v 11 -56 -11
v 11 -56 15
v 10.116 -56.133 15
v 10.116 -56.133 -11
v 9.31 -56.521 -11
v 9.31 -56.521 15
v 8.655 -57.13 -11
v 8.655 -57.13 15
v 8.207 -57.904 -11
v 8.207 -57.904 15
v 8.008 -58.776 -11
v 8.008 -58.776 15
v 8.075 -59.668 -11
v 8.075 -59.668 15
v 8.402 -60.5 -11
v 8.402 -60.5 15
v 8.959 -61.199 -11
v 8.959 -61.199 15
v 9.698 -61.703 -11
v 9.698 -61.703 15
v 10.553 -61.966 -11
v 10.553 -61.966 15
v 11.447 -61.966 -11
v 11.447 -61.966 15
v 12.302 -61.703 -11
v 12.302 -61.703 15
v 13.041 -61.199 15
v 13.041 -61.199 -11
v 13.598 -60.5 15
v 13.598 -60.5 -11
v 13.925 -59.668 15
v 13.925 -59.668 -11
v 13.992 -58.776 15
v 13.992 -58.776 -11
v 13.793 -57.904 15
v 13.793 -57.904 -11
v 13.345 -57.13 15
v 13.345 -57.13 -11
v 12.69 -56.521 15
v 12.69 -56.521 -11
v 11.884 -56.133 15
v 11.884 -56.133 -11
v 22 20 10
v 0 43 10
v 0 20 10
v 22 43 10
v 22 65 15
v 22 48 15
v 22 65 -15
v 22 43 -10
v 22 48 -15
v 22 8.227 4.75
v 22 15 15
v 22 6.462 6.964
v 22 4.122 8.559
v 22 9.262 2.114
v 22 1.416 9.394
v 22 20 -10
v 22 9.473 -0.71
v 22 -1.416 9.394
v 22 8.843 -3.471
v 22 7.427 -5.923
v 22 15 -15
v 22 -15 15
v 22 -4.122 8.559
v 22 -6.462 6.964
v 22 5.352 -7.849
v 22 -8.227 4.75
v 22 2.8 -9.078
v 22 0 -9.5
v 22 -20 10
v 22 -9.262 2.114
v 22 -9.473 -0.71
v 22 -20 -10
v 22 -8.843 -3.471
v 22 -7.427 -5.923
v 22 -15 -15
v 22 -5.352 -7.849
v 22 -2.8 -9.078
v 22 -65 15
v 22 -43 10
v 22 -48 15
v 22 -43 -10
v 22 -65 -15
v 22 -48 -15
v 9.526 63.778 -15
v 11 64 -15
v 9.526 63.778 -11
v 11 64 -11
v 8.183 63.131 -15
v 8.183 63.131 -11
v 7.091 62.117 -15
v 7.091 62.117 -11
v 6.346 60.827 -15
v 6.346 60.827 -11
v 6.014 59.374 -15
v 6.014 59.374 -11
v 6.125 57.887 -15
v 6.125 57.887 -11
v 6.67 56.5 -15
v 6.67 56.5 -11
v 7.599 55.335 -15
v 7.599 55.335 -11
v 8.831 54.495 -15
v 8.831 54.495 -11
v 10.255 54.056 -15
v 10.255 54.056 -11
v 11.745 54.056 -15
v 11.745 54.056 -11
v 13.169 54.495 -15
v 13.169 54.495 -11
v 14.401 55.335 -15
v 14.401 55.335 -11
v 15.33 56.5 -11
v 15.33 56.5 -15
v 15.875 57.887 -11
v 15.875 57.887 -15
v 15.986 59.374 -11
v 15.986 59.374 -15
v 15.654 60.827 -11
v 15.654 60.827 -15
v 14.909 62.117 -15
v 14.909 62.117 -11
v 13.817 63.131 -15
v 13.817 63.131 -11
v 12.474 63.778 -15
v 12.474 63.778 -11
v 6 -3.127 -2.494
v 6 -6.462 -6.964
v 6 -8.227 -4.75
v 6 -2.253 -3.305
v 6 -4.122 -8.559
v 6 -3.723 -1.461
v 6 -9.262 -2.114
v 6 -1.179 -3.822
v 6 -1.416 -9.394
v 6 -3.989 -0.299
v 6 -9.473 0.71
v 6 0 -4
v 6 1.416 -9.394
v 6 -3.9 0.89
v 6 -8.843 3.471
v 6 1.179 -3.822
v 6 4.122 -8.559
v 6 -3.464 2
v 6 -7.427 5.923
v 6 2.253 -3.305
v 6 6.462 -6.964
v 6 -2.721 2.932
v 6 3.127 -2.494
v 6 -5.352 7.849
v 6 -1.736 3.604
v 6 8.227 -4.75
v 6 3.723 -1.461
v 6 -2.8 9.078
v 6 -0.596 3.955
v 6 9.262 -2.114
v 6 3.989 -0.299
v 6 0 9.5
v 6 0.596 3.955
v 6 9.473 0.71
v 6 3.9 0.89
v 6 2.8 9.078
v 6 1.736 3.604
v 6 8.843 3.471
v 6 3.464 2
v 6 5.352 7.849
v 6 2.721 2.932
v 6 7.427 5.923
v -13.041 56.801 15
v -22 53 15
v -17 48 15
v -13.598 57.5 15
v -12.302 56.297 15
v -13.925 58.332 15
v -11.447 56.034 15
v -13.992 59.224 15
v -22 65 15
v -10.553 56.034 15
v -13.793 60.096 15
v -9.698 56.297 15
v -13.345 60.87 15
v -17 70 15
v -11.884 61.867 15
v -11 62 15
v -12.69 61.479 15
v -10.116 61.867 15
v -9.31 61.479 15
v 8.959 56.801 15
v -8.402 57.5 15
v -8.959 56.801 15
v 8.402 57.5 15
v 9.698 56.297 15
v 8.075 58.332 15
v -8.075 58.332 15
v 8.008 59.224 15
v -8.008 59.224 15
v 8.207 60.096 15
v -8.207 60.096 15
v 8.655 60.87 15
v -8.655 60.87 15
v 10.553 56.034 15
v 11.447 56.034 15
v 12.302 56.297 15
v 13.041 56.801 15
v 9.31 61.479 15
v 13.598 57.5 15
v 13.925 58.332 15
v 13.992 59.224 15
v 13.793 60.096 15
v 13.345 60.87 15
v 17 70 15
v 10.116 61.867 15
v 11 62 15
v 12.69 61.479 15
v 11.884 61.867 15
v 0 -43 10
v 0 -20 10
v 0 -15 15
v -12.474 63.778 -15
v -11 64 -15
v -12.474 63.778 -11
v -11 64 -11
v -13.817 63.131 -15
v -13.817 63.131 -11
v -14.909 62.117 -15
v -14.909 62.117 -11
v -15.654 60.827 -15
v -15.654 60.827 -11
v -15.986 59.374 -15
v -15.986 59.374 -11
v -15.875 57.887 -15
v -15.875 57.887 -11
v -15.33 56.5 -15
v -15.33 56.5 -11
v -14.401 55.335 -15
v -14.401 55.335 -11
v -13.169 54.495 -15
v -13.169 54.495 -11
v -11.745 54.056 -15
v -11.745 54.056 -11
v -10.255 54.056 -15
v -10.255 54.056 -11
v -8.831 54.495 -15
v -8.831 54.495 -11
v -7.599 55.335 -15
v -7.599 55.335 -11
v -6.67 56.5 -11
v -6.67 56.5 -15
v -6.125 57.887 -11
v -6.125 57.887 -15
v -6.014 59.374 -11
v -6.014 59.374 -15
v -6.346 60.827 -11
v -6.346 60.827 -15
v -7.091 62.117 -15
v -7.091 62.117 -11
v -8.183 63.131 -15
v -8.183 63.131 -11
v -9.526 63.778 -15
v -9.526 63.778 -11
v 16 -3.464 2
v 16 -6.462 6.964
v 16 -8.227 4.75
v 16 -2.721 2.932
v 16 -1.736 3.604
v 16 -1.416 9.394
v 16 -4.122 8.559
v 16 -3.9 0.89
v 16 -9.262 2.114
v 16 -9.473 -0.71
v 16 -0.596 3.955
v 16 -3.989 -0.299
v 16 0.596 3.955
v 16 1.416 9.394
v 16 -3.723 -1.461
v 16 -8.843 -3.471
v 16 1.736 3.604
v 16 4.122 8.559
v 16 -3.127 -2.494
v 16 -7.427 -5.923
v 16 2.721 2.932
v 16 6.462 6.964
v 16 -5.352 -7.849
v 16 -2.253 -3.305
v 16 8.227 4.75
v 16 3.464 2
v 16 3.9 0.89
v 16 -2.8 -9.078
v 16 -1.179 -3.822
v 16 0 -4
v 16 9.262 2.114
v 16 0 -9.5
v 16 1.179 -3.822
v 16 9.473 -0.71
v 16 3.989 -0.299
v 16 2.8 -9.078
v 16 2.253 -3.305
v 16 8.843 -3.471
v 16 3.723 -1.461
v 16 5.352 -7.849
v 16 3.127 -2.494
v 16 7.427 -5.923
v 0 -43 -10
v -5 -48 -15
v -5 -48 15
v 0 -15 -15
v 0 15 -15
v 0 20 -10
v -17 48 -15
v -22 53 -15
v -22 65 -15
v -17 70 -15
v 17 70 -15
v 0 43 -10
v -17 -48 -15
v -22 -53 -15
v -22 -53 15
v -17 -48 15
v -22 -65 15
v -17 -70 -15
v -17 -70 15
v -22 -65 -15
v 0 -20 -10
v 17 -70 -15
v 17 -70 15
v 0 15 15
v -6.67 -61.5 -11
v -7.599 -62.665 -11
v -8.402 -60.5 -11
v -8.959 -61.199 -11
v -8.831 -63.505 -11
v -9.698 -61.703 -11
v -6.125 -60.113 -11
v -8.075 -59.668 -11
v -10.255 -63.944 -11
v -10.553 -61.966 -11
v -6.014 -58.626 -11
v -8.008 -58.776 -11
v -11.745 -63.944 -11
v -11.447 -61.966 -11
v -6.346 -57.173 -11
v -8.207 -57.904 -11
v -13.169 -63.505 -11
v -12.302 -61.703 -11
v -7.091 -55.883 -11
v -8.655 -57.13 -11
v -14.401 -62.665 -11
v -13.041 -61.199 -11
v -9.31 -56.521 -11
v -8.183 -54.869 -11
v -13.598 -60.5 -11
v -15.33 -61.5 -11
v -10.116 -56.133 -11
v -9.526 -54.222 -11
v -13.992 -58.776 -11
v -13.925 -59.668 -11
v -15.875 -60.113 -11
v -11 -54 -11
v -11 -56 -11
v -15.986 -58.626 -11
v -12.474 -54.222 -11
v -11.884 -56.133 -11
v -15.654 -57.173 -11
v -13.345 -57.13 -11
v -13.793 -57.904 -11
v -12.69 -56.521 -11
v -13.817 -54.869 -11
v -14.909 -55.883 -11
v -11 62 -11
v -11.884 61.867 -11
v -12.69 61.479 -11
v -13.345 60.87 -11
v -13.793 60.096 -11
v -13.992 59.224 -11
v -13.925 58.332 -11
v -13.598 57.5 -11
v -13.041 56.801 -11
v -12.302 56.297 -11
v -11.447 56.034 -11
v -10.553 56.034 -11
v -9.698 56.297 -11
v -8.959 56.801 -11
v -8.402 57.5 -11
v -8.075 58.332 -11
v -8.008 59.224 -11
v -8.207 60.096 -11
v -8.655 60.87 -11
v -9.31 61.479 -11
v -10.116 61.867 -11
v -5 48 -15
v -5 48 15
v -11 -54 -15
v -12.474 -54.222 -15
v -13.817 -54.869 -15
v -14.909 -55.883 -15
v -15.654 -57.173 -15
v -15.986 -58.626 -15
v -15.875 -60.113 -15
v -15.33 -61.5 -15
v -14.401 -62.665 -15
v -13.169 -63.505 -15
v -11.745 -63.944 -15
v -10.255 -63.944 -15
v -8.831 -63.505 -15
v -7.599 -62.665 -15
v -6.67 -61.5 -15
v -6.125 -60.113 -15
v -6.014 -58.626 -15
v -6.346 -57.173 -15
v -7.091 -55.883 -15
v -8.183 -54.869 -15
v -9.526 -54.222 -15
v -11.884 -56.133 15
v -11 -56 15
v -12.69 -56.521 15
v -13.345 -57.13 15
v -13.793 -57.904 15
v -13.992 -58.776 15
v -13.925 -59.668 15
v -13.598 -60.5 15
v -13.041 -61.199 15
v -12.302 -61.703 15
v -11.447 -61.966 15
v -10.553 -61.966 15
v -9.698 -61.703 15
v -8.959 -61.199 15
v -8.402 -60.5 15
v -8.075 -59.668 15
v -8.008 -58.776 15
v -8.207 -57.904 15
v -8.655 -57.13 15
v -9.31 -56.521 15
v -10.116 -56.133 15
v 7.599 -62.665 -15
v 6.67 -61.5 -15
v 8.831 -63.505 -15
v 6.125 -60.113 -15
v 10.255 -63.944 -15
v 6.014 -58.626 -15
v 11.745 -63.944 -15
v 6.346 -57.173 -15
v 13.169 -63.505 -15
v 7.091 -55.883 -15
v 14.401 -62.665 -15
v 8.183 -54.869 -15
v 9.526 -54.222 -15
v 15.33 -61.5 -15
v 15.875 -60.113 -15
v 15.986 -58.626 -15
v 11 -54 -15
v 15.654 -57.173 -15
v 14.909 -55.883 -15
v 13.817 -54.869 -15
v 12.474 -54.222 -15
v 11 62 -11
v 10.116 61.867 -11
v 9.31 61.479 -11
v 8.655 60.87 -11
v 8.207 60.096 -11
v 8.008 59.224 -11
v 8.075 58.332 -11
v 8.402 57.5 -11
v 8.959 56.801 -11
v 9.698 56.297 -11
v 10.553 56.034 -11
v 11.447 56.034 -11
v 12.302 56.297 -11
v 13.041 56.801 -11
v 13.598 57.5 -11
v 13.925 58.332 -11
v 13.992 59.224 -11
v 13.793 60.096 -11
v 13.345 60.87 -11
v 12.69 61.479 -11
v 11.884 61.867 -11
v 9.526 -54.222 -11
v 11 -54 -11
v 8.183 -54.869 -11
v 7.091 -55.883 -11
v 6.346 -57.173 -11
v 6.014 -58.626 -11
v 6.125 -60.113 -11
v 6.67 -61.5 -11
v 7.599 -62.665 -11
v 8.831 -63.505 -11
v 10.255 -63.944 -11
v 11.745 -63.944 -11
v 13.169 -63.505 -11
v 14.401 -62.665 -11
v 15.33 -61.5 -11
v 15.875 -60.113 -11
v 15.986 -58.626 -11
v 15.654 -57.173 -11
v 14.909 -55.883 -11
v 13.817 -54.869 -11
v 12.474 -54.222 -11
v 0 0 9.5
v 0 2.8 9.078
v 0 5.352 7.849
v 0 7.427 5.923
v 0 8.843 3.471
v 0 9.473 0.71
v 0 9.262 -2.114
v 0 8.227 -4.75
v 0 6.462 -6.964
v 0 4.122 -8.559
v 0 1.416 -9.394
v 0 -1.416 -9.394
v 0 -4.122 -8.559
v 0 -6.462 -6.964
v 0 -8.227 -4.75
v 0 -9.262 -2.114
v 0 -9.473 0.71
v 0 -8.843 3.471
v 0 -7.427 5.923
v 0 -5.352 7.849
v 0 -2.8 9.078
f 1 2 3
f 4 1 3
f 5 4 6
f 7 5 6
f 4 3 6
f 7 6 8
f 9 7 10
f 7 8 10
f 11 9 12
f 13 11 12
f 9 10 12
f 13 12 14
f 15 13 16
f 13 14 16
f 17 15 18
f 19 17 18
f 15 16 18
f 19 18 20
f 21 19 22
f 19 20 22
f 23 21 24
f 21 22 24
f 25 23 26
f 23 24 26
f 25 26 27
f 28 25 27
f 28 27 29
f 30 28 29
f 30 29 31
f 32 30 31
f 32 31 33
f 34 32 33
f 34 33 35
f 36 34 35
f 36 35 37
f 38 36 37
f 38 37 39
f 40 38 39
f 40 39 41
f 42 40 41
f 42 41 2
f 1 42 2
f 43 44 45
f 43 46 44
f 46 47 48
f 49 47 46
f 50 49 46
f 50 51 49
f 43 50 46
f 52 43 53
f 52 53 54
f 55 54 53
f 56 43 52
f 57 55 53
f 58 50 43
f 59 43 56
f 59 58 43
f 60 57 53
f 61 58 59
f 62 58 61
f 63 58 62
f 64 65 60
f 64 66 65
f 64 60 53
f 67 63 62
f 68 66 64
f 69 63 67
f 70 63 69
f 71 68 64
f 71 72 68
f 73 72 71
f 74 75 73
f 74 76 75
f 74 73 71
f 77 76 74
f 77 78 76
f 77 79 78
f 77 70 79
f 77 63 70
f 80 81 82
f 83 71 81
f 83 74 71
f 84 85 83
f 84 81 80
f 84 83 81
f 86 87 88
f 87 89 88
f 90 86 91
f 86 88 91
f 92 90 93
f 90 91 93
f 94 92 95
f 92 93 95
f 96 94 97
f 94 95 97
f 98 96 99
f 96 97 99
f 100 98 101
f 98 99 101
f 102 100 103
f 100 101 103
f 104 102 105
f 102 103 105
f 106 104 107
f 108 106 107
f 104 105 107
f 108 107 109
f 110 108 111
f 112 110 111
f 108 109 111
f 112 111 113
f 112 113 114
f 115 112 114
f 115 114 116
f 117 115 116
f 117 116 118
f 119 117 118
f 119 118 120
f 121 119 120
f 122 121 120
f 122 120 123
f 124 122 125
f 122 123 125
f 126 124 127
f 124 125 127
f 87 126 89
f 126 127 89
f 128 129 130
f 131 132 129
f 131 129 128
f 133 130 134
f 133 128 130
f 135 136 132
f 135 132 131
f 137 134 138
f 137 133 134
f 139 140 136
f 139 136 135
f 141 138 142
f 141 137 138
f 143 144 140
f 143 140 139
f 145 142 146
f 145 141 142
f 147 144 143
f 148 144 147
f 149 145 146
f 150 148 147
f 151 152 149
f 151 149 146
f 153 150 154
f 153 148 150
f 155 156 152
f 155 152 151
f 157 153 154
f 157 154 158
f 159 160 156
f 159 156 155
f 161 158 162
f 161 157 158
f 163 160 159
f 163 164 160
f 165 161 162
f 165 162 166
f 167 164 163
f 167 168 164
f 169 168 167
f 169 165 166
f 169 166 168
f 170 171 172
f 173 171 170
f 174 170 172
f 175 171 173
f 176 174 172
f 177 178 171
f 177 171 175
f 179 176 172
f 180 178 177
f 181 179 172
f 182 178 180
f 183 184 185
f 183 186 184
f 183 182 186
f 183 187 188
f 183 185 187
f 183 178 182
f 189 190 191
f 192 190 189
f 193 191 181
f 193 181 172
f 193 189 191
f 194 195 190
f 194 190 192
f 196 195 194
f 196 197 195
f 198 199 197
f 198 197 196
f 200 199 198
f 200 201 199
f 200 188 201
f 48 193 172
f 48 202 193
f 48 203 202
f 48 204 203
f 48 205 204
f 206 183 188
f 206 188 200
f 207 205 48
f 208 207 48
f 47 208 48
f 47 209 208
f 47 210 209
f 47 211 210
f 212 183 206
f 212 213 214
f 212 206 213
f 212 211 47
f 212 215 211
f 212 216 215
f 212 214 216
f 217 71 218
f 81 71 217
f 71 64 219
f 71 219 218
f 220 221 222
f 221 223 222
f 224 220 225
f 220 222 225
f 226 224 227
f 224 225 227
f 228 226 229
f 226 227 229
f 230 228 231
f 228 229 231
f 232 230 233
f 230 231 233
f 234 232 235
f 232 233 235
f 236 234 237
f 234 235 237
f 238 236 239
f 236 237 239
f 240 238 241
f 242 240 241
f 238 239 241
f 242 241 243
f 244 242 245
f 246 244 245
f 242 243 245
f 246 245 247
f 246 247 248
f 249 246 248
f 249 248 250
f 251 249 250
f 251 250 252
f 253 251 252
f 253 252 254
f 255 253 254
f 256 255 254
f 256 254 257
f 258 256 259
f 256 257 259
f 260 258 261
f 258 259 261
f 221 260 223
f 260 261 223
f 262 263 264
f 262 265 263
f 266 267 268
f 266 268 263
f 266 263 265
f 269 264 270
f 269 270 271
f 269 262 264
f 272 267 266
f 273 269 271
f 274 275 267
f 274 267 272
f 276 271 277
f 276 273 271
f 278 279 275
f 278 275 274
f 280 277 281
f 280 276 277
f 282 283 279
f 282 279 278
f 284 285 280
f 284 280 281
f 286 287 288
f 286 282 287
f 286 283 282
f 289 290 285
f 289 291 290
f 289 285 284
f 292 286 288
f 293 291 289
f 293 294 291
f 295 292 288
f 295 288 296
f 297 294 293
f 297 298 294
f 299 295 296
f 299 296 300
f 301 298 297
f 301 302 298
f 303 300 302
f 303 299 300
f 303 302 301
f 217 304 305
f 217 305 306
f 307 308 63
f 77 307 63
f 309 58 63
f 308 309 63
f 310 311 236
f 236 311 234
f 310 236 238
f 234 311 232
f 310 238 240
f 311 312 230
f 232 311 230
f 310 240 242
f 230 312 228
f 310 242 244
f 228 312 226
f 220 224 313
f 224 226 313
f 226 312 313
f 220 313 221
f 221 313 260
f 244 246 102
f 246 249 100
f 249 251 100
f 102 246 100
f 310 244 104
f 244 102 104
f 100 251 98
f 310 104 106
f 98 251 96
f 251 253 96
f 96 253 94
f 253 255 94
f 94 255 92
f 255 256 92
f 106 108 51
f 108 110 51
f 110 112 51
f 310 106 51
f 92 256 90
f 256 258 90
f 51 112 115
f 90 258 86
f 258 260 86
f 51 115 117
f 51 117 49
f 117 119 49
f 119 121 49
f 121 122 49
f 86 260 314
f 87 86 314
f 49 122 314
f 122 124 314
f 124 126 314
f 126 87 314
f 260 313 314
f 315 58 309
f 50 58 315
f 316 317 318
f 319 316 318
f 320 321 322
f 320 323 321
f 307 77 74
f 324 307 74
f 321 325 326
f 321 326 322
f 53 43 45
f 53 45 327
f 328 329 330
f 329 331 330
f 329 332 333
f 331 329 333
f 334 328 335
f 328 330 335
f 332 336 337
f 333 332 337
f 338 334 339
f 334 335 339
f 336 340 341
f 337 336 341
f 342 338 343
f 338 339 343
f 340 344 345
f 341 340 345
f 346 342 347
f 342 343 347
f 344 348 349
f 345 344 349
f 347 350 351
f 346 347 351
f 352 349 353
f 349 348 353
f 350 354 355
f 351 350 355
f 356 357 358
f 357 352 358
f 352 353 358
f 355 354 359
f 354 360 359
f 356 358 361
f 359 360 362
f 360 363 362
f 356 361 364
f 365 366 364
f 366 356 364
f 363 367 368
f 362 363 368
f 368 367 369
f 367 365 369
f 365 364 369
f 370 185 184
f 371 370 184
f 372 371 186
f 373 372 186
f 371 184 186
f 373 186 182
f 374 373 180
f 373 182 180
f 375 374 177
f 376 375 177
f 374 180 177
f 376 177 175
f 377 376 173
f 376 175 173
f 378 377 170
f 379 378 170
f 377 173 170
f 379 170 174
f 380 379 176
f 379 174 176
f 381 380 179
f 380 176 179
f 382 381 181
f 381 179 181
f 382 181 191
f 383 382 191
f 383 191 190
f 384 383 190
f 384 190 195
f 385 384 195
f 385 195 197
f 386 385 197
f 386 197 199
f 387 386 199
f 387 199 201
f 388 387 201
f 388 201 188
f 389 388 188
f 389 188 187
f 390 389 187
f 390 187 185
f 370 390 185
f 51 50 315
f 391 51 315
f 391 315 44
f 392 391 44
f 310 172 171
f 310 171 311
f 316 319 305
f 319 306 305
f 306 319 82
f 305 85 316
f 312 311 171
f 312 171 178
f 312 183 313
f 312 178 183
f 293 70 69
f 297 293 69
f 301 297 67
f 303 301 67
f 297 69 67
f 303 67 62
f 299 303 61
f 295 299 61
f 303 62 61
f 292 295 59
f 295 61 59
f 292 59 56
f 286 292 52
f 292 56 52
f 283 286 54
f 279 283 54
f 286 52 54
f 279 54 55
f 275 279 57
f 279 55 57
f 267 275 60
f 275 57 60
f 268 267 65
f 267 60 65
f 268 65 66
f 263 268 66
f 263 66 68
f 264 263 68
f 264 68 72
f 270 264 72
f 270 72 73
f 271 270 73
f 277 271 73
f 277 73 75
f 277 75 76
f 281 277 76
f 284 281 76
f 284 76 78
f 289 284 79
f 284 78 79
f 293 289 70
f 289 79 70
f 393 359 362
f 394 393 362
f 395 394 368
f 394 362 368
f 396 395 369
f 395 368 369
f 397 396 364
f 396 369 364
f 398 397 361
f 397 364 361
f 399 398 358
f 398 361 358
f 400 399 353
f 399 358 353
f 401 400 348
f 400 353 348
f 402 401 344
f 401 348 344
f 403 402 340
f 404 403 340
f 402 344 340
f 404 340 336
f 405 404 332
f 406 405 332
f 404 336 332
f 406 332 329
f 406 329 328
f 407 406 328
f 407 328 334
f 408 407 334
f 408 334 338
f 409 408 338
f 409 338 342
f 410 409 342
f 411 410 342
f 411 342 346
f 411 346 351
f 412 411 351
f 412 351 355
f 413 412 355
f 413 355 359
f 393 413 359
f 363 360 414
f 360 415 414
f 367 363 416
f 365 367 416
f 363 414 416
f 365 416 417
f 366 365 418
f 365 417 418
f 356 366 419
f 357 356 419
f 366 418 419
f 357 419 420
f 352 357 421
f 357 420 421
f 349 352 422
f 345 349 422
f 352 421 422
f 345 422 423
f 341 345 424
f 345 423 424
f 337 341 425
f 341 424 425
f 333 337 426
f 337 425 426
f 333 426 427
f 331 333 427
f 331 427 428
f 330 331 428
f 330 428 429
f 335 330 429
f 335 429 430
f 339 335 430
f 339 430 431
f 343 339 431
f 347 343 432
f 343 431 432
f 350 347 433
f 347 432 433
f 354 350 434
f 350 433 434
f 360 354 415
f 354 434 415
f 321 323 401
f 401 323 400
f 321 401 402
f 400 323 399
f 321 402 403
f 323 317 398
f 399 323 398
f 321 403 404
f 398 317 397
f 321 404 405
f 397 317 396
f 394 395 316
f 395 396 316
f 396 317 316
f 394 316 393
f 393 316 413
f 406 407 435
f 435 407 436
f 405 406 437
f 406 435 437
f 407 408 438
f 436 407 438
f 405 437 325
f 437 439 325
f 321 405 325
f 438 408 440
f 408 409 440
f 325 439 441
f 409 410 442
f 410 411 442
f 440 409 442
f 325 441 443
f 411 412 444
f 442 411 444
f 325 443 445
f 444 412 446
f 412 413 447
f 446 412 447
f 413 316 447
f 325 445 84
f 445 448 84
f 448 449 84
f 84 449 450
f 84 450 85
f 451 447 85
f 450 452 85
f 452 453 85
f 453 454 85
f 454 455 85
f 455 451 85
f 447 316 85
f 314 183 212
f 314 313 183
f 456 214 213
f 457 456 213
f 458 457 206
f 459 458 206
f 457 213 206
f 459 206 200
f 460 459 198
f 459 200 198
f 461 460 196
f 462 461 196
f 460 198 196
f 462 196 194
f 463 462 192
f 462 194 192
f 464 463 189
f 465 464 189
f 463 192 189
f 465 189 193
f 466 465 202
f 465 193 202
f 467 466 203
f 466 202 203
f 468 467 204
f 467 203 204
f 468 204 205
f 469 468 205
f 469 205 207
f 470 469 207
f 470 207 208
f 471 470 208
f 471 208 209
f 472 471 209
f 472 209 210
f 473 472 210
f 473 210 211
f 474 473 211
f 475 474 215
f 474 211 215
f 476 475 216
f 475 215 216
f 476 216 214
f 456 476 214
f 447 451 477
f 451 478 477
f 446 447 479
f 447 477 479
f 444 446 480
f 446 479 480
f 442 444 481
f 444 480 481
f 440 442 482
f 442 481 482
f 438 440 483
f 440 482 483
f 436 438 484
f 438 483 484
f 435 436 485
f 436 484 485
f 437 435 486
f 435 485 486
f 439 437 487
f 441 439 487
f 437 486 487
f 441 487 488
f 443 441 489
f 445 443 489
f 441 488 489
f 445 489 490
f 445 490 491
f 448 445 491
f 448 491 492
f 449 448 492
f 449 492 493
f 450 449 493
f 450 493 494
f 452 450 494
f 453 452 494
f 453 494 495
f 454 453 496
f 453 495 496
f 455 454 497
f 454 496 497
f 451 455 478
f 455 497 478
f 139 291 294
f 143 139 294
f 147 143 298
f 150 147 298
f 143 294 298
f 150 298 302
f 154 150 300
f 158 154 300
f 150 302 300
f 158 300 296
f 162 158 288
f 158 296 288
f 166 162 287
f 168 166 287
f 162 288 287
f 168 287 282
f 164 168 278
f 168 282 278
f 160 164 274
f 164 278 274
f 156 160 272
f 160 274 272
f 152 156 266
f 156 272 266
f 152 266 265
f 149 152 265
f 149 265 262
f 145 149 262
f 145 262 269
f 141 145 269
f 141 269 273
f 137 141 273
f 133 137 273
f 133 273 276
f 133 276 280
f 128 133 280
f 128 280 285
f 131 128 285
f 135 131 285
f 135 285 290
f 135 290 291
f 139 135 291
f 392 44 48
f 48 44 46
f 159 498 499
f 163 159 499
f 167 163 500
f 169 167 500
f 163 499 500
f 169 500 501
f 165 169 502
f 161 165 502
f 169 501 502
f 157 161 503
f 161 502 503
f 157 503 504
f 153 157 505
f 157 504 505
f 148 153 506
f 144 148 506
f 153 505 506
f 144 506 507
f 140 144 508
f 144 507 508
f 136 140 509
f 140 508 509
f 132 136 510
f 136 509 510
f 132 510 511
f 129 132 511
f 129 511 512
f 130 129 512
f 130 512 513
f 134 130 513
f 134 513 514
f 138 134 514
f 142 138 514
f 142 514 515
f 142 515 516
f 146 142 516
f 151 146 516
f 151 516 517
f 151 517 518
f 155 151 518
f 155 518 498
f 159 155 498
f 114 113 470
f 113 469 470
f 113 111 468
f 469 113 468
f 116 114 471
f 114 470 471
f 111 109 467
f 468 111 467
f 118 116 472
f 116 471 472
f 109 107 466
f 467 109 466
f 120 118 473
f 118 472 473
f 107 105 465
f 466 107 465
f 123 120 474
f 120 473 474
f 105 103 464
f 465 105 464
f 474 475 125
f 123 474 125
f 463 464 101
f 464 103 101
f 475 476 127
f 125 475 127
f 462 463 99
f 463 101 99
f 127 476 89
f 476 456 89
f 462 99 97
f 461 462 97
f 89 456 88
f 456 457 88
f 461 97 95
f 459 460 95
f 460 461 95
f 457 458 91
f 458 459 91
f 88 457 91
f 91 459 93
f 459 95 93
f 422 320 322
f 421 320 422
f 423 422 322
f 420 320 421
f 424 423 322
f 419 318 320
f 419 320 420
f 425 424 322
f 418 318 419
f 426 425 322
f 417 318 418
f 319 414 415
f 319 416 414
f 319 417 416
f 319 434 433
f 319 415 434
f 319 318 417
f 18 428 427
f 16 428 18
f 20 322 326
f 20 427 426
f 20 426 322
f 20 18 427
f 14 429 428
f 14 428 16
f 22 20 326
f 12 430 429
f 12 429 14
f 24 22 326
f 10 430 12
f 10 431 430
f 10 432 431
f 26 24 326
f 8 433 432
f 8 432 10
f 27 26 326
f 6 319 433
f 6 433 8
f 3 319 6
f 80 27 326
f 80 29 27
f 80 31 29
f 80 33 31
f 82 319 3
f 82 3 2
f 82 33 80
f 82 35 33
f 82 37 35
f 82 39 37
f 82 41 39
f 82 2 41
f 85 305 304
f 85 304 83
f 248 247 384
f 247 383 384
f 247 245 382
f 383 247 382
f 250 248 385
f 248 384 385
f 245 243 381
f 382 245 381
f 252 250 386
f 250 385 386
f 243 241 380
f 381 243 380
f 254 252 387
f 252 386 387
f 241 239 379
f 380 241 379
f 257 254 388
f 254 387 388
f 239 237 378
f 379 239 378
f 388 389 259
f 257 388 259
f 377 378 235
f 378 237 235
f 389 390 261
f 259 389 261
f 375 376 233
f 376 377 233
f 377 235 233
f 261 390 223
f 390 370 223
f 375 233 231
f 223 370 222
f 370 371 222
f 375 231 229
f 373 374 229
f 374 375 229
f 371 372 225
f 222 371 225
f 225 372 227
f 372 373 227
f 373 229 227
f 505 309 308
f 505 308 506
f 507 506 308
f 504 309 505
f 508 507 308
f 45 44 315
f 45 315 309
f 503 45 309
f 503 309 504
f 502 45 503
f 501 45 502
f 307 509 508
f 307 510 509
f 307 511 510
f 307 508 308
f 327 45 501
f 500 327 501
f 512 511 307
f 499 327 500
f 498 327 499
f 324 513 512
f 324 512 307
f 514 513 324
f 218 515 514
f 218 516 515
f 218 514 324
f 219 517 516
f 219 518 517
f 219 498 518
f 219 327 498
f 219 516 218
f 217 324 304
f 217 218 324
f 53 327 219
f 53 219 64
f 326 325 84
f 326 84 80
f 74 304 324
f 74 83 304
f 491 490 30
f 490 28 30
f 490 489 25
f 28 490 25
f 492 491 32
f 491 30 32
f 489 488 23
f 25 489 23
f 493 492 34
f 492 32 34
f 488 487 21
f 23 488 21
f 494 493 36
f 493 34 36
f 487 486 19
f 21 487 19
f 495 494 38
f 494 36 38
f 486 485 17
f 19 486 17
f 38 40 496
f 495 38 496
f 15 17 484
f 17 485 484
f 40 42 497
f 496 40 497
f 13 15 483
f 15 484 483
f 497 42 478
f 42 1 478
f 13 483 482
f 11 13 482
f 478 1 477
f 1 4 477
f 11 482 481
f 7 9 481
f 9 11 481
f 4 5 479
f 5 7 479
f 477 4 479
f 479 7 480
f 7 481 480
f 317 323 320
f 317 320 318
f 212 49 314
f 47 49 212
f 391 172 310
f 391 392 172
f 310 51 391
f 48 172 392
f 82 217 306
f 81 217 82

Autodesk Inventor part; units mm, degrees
ref_plane "YZ Plane" through (0, 0, 0) normal (1, 0, 0) x (0, 1, 0)
ref_plane "XZ Plane" through (0, 0, 0) normal (0, 1, 0) x (-1, 0, 0)
ref_plane "XY Plane" through (0, 0, 0) normal (0, 0, 1) x (1, 0, 0)
sketch "Esquisse17" plane through (0, 0, 0) normal (0, 0, 1) x (1, 0, 0)
  line L0 (-22, 70) -> (22, 70)
  line L1 (22, 70) -> (22, -70)
  line L2 (22, -70) -> (-22, -70)
  line L3 (-22, -70) -> (-22, 70)
  point P0 (0, 0)
  dimension "d107" = 70
  dimension "d108" = 140
  dimension "d109" = 44
  dimension "d110" = 22
extrude "Extrusion13" add sketch "Esquisse17" along normal mid plane 30
sketch "Esquisse18" plane through (22, -70, 15) normal (1, 0, 0) x (0, 0, -1)
  circle A0 centre (15, 70) radius 4
  dimension "d113" = 8
extrude "Extrusion14" cut sketch "Esquisse18" against normal up to next
sketch "Esquisse19" plane through (22, -70, 15) normal (1, 0, 0) x (0, 0, -1)
  circle A0 centre (15, 70) radius 9.5
  dimension "d116" = 19
extrude "Extrusion15" cut sketch "Esquisse19" against normal blind 6
sketch "Esquisse20" plane through (0, 0, 15) normal (0, 0, 1) x (1, 0, 0)
  line L0 (-22, 48) -> (0, 48)
  line L1 (0, 48) -> (0, -48)
  line L2 (0, -48) -> (-22, -48)
  line L3 (-22, -48) -> (-22, 48)
  line L4 (22, -70) -> (22, 70) projected
  line L5 (-22, 70) -> (-22, -70) projected
  point P0 (0, 0)
  dimension "d119" = 96
  dimension "d120" = 48
  dimension "d121" = 22
extrude "Extrusion16" cut sketch "Esquisse20" against normal up to next
sketch "Esquisse21" plane through (0, -48, 15) normal (-1, 0, 0) x (0, 0, 1)
  circle A0 centre (-15, 48) radius 9.5
  dimension "d125" = 19
extrude "Extrusion17" cut sketch "Esquisse21" against normal blind 6
sketch "Esquisse22" plane through (22, -70, 15) normal (1, 0, 0) x (0, 0, -1)
  line L0 (5, 0) -> (25, 0)
  line L1 (25, 140) -> (5, 140)
  line L2 (0, 0) -> (30, 0) projected
  line L3 (0, 140) -> (30, 140) projected
  line L4 (0, 0) -> (0, 140) projected
  line L5 (30, 140) -> (30, 0) projected
  line L6 (30, 55) -> (30, 85)
  line L7 (0, 85) -> (0, 55)
  line L8 (0, 55) -> (0, 55)
  line L9 (30, 55) -> (30, 55)
  line L10 (5, 140) -> (5, 90)
  line L11 (5, 50) -> (5, 0)
  line L12 (25, 0) -> (25, 50)
  line L13 (25, 90) -> (25, 140)
  line L14 (30, 85) -> (30, 85)
  line L15 (0, 85) -> (0, 85)
  line L16 (0, 55) -> (5, 50)
  line L17 (5, 90) -> (0, 85)
  line L18 (25, 90) -> (30, 85)
  line L19 (30, 55) -> (25, 50)
  line L20 (0, 118) -> (5, 118)
  line L21 (25, 118) -> (30, 118)
  line L22 (0, 22) -> (5, 22)
  line L23 (25, 22) -> (30, 22)
  point P0 (15, 70)
  point P1 (5, 55)
  point P2 (25, 55)
  point P3 (5, 85)
  point P4 (25, 85)
  dimension "d131" = 30
  dimension "d133" = 20
  dimension "d134" = 10
  dimension "d135" = 30
  dimension "d136" = 15
  dimension "d137" = 5
  dimension "d138" = 5
  dimension "d139" = 5
  dimension "d140" = 5
  dimension "d141" = 5
  dimension "d142" = 5
  dimension "d143" = 5
  dimension "d144" = 5
extrude "Extrusion19" cut sketch "Esquisse22" against normal up to next contours L22 L4 L16 L11 | L12 L19 L5 L23 | L4 L20 L10 L17 | L18 L13 L21 L5
chamfer "Chanfrein3" distance 5 angle 45 10 edges at (11, -48, -10) (11, -48, 10) (11, 48, 10) (11, 48, -10) (-22, -48, 0) (-22, -70, 0) (-22, 48, 0) (-22, 70, 0) (22, -70, 0) (22, 70, 0)
sketch "Esquisse23" plane through (0, 0, -15) normal (0, 0, -1) x (-1, 0, 0)
  line L0 (-11, -59) -> (11, -59)
  line L1 (17, -48) -> (0, -48) projected
  line L2 (0, -48) -> (-22, -48) projected
  line L3 (-22, -48) -> (-22, -65) projected
  line L4 (-17, -70) -> (17, -70) projected
  line L5 (22, -65) -> (22, -53) projected
  line L6 (-46.7579, 0) -> (65.4048, 0)
  line L7 (-11, 59) -> (11, 59)
  line L8 (20, 48) -> (0, 48)
  line L9 (0, 48) -> (-22, 48)
  line L10 (-22, 48) -> (-22, 70)
  line L11 (-22, 70) -> (20, 70)
  line L12 (20, 70) -> (20, 48)
  line L13 (0, 15) -> (-22, 15) projected
  line L14 (-22, 15) -> (-22, -15) projected
  line L15 (-22, -15) -> (0, -15) projected
  line L16 (0, -15) -> (0, 15) projected
  line L17 (-17, -70) -> (-22, -65) projected
  line L18 (22, -65) -> (17, -70) projected
  line L19 (17, -48) -> (22, -53) projected
  line L20 (-22, 65) -> (-17, 70) projected
  line L21 (-22, 48) -> (0, 48) projected
  line L22 (0, 48) -> (17, 48) projected
  line L23 (22, 53) -> (17, 48) projected
  line L24 (22, 53) -> (22, 65) projected
  line L25 (17, 70) -> (22, 65) projected
  line L26 (17, 70) -> (-17, 70) projected
  line L27 (-22, 65) -> (-22, 48) projected
  point P0 (0, 0)
  dimension "d153" = 11
  dimension "d154" = 11
  dimension "d155" = 11
hole "Perçage4" at (11, -59, -15) at (-11, -59, -15) at (11, 59, -15) at (-11, 59, -15) direction (0, 0, 1) diameter 6 end through all counterbore diameter 10 counterbore depth 4
chamfer "Chanfrein4" distance 5 angle 45 2 edges at (0, 48, 0) (0, -48, 0)
equation "\"d107\" = 0.5 * d108"
equation "\"d110\" = 0.5 * d109"
equation "\"d120\" = 0.5 * d119"
equation "\"d134\" = 0.5 * d133"
equation "\"d135\" = d131"
equation "\"d136\" = 0.5 * d135"
equation "\"d138\" = d137"
equation "\"d139\" = d137"
equation "\"d140\" = d139"
equation "\"d141\" = d137"
equation "\"d142\" = d141"
equation "\"d143\" = d137"
equation "\"d144\" = d143"
equation "\"d153\" = 0.5 * d152"
equation "\"d154\" = d153"
equation "\"d155\" = d153"
equation "\"d132\" = 0.5 * d130"
equation "\"d152\" = 22"
equation "\"d130\" = 30"
properties part number "Wheel_Block"
